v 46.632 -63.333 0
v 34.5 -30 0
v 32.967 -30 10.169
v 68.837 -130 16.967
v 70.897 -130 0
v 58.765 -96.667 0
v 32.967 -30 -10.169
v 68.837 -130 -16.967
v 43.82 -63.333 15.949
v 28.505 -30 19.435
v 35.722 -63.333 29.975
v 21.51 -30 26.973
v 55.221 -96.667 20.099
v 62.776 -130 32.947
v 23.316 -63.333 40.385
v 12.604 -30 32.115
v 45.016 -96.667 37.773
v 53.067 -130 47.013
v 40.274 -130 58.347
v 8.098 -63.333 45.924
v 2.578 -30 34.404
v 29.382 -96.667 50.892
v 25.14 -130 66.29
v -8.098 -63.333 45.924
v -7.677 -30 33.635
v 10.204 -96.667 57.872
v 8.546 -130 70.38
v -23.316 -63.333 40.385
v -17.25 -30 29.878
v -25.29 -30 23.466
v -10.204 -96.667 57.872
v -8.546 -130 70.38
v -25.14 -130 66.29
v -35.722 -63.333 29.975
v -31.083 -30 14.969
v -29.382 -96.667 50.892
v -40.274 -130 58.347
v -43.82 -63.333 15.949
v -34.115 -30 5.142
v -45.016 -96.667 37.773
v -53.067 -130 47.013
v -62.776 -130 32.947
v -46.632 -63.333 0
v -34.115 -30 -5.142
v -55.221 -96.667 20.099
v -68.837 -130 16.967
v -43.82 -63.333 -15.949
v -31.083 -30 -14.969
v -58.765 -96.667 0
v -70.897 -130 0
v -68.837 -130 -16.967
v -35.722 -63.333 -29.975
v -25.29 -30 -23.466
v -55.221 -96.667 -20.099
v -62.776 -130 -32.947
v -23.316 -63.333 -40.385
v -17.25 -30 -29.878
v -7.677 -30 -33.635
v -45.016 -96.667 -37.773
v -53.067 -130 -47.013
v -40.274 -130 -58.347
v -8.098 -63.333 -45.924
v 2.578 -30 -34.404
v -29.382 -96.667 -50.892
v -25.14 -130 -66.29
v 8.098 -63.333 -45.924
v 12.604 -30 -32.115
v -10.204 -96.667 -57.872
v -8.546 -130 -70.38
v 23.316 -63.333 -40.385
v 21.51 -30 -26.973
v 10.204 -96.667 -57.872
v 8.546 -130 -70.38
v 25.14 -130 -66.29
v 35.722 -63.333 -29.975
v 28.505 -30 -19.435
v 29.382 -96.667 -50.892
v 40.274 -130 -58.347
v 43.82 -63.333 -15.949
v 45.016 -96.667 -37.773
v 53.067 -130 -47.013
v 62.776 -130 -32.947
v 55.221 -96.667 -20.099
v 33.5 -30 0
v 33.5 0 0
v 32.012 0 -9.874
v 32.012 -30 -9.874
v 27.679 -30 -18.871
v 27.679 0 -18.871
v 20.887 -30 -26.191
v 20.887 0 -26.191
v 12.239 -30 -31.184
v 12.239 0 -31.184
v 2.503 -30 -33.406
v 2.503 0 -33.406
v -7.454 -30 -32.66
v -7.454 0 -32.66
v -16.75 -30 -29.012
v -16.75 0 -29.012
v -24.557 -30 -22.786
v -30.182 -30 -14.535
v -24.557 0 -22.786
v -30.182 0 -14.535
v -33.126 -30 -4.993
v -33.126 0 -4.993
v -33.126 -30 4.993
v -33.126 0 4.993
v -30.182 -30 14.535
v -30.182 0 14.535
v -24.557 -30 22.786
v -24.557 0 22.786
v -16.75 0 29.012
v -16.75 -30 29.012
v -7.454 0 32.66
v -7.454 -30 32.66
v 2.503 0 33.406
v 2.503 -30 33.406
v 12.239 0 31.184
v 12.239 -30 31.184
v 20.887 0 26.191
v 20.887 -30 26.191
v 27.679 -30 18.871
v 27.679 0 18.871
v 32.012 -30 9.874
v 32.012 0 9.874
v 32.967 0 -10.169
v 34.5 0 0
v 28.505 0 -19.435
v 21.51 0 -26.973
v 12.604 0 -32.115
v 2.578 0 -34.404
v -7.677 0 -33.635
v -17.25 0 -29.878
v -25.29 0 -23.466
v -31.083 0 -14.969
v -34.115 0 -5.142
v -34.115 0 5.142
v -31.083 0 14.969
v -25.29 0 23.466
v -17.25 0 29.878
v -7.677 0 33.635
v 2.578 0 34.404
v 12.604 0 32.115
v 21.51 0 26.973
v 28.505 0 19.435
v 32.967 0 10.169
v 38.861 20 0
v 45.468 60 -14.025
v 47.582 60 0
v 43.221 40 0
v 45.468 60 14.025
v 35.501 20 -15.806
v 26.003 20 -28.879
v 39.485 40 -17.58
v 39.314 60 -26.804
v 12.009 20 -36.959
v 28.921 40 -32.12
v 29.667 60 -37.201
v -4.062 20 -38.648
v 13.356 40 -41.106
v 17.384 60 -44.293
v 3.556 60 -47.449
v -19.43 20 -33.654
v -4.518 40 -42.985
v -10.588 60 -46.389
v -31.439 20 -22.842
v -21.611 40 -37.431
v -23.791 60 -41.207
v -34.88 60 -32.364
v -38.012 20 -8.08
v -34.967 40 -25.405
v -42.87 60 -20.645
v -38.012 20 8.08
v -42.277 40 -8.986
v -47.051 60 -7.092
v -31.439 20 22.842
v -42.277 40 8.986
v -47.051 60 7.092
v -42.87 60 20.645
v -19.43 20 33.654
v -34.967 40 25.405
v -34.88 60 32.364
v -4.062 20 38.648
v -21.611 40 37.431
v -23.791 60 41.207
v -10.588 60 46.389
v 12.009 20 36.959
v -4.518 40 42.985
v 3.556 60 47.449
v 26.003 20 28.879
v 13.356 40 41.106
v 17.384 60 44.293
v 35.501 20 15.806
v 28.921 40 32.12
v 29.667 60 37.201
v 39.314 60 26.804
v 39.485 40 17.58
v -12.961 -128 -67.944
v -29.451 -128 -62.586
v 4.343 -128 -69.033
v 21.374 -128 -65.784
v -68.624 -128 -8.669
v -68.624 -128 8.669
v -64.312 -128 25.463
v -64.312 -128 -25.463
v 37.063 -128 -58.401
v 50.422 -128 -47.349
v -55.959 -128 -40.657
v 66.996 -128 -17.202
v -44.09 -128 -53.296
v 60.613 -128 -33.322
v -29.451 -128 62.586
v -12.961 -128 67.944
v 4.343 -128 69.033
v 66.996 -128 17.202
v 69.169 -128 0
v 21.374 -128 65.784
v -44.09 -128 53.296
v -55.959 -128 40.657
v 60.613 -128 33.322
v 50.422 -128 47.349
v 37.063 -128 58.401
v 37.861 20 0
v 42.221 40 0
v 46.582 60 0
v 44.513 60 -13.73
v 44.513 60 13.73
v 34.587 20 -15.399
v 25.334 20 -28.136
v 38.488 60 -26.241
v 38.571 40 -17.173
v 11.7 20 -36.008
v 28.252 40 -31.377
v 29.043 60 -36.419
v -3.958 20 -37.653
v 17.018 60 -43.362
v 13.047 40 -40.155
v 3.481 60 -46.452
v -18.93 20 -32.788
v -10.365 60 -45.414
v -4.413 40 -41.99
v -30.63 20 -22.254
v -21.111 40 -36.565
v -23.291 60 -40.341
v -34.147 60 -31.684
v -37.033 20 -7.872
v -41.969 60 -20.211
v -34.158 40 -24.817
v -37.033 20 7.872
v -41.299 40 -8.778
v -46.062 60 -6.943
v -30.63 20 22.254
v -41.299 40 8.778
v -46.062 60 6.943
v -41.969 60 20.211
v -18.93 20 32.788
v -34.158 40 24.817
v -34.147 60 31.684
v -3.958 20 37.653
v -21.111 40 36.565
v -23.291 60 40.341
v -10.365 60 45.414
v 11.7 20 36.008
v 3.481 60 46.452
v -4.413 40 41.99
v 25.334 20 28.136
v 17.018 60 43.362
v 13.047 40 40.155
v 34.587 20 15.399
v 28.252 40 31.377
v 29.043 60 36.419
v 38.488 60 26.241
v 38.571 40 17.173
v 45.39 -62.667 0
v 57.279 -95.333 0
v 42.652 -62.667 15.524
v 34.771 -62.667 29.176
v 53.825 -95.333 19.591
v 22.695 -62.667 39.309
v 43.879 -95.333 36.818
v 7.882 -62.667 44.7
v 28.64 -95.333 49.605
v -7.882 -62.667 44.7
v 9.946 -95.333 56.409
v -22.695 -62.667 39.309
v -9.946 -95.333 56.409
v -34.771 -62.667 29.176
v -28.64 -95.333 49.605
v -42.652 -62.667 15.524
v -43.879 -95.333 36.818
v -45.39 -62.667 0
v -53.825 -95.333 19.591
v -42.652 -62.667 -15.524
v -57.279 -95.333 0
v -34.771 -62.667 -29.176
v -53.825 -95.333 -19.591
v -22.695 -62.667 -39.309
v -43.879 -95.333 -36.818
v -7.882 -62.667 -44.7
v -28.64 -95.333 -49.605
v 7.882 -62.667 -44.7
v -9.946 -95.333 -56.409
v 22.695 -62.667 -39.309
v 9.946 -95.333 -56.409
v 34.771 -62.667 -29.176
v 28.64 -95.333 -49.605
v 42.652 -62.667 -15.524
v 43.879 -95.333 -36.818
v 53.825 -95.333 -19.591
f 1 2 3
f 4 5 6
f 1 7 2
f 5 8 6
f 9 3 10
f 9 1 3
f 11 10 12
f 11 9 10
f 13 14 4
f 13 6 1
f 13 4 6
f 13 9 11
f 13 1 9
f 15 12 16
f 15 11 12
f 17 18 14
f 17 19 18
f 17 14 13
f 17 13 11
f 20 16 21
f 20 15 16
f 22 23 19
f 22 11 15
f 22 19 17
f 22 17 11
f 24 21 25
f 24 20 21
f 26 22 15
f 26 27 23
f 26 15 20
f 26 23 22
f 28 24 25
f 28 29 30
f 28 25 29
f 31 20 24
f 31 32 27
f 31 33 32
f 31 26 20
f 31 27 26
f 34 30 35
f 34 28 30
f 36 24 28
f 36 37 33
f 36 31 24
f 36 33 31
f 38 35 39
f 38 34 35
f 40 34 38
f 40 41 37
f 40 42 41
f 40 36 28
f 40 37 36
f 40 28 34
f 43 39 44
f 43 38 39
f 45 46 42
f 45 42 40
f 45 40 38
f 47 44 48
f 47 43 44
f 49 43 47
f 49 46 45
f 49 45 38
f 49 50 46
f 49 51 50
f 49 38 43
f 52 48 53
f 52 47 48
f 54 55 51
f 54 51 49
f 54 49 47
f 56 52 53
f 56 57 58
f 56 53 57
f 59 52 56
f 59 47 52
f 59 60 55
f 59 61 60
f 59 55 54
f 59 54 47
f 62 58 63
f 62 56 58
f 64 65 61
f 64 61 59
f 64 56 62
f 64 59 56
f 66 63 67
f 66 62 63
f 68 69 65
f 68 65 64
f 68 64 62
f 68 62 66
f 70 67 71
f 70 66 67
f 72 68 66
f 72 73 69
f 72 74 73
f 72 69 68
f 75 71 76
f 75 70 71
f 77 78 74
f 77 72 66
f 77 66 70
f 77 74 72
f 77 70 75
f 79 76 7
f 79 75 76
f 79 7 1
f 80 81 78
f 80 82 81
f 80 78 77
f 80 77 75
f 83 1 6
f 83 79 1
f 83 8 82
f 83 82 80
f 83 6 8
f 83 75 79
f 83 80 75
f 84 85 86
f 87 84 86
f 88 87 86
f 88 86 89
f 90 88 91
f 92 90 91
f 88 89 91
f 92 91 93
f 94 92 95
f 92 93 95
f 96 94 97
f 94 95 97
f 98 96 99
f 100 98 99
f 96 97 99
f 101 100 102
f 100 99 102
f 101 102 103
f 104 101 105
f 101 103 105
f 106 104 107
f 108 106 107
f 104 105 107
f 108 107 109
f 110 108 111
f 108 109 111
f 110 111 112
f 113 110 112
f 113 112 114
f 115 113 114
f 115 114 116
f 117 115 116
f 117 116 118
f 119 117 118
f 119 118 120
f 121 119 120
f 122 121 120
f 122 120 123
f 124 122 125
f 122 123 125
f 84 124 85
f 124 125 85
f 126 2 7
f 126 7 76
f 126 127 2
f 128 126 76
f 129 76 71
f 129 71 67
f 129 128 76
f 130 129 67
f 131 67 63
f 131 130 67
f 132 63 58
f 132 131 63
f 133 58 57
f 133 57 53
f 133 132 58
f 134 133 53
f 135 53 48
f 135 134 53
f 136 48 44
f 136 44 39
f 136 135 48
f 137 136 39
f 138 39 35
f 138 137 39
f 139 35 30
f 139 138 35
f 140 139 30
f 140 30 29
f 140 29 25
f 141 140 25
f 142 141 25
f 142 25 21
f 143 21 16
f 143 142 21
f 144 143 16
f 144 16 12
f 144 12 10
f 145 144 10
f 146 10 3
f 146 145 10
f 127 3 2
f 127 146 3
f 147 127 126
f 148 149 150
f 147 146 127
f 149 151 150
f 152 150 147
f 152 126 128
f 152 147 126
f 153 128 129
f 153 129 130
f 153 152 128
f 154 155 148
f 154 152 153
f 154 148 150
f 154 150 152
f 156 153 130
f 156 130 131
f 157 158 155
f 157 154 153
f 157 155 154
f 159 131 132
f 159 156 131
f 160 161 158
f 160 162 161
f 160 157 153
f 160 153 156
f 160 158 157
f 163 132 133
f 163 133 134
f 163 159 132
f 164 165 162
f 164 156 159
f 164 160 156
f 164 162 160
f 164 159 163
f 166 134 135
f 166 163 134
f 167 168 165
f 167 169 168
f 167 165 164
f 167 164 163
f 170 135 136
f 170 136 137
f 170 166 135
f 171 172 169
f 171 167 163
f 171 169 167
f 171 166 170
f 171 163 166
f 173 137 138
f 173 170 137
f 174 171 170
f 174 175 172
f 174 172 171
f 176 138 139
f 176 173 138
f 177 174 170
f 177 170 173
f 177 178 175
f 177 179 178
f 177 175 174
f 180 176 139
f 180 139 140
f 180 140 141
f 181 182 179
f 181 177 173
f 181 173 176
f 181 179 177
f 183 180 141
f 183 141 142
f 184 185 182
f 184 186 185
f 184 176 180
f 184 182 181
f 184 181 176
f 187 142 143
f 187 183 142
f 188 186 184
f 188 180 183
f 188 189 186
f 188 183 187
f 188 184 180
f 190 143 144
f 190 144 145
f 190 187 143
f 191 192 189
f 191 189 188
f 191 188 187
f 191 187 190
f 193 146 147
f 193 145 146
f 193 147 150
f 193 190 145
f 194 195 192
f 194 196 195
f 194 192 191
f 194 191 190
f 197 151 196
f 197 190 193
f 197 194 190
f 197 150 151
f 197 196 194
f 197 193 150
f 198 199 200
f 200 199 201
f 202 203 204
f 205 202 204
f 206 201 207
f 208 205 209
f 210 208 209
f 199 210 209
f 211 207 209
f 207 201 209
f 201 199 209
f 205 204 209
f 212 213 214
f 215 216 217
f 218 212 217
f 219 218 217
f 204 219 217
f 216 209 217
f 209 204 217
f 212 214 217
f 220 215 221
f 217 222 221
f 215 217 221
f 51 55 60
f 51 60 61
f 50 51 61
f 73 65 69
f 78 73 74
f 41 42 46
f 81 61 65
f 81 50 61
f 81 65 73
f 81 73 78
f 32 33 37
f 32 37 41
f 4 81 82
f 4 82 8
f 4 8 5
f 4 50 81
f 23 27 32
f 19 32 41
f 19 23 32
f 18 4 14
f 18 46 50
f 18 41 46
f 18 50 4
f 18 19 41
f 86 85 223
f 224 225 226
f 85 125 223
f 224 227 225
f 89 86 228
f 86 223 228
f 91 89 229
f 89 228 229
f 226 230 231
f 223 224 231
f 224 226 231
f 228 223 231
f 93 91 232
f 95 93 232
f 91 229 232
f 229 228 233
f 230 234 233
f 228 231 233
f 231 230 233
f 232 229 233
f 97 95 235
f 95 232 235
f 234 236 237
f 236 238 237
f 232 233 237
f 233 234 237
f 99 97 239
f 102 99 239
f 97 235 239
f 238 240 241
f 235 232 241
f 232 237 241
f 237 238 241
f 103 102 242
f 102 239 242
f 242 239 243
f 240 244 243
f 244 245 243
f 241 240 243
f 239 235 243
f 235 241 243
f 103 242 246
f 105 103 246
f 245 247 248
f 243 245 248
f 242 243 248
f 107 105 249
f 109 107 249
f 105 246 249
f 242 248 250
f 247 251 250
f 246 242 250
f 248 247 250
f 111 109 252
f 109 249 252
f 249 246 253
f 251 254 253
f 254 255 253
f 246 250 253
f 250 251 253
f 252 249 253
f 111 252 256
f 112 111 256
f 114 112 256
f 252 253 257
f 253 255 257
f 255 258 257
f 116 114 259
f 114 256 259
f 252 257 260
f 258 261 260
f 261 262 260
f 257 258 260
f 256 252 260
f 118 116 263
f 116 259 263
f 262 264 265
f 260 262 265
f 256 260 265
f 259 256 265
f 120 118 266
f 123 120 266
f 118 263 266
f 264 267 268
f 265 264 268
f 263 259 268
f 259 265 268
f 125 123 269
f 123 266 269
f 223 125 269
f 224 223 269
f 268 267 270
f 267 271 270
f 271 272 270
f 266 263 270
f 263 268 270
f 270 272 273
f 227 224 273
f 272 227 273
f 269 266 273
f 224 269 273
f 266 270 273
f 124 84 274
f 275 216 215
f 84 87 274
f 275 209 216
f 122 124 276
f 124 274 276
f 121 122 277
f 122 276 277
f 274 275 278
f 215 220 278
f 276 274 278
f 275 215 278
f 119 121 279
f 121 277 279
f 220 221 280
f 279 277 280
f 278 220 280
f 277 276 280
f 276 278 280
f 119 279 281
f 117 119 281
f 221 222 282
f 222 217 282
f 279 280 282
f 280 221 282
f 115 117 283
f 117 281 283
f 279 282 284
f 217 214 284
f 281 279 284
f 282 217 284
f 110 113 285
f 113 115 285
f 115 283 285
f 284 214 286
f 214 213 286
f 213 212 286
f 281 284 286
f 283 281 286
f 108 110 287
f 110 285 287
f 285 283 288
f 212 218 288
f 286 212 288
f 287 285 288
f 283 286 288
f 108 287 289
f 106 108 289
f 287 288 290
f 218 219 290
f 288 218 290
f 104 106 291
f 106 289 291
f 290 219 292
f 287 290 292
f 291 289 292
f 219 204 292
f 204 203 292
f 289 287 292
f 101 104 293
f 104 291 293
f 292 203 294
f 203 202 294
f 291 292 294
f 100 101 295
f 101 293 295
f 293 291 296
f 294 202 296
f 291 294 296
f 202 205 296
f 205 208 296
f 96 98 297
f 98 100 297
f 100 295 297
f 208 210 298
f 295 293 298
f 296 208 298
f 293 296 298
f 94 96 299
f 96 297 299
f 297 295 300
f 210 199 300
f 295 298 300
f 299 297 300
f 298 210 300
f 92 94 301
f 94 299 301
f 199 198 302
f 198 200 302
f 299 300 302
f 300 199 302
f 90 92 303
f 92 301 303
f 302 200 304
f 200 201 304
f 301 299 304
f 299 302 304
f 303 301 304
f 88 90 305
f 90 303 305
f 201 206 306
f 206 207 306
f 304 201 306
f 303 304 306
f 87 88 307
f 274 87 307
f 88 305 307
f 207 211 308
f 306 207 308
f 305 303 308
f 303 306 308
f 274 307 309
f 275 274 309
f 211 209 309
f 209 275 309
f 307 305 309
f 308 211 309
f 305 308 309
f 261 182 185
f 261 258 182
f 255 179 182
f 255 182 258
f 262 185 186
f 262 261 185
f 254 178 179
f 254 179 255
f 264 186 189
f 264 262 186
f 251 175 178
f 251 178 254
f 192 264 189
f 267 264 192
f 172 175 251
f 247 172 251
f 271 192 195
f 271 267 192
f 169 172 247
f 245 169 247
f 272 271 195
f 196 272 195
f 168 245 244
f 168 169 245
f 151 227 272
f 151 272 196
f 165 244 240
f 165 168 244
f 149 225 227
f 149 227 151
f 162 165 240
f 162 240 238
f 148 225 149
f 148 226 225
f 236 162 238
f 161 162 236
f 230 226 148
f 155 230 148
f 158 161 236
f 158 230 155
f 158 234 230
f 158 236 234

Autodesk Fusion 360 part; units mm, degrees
sketch "草图1" plane through (0, 0, 0) normal (0, 1, 0) x (1, 0, 0)
  circle A0 centre (0, 0) radius 46.5
  circle A1 centre (0, 0) radius 47.5
  circle A2 centre (0, 0) radius 33.5
  circle A3 centre (0, 0) radius 34.5
  circle A4 centre (0, 0) radius 45.5
  circle A5 centre (0, 0) radius 30
  circle A6 centre (0, 0) radius 29
  circle A7 centre (0, 0) radius 31
  dimension "d1" = 93
  dimension "d2" = 95
  dimension "d5" = 67
  dimension "d6" = 69
  dimension "d21" = 91
  dimension "d26" = 60
  dimension "d29" = 58
  dimension "d30" = 62
extrude "拉伸8" add sketch "草图1" along normal blind 60 draft 12.3 contours A3
extrude "拉伸9" cut sketch "草图1" along normal blind 60 draft 12.3 contours A2 | A5 | A6 | A7
extrude "拉伸11" add sketch "草图1" against normal blind 30 contours A3
sketch "草图5" plane through (0, -30, 0) normal (0, -1, 0) x (1, 0, 0)
  circle A0 centre (0, 0) radius 33.5
  circle A1 centre (0, 0) radius 34.5
extrude "拉伸13" add sketch "草图5" along normal blind 100 draft 20
extrude "拉伸14" cut sketch "草图5" along normal blind 100 draft 20 contours A0
sketch "草图6" plane through (0, -130, 0) normal (0, -1, 0) x (1, 0, 0)
  circle A0 centre (0, 0) radius 69.897
  circle A1 centre (0, 0) radius 70.897
extrude "拉伸15" add sketch "草图6" against normal blind 2 draft -20 contours A0
